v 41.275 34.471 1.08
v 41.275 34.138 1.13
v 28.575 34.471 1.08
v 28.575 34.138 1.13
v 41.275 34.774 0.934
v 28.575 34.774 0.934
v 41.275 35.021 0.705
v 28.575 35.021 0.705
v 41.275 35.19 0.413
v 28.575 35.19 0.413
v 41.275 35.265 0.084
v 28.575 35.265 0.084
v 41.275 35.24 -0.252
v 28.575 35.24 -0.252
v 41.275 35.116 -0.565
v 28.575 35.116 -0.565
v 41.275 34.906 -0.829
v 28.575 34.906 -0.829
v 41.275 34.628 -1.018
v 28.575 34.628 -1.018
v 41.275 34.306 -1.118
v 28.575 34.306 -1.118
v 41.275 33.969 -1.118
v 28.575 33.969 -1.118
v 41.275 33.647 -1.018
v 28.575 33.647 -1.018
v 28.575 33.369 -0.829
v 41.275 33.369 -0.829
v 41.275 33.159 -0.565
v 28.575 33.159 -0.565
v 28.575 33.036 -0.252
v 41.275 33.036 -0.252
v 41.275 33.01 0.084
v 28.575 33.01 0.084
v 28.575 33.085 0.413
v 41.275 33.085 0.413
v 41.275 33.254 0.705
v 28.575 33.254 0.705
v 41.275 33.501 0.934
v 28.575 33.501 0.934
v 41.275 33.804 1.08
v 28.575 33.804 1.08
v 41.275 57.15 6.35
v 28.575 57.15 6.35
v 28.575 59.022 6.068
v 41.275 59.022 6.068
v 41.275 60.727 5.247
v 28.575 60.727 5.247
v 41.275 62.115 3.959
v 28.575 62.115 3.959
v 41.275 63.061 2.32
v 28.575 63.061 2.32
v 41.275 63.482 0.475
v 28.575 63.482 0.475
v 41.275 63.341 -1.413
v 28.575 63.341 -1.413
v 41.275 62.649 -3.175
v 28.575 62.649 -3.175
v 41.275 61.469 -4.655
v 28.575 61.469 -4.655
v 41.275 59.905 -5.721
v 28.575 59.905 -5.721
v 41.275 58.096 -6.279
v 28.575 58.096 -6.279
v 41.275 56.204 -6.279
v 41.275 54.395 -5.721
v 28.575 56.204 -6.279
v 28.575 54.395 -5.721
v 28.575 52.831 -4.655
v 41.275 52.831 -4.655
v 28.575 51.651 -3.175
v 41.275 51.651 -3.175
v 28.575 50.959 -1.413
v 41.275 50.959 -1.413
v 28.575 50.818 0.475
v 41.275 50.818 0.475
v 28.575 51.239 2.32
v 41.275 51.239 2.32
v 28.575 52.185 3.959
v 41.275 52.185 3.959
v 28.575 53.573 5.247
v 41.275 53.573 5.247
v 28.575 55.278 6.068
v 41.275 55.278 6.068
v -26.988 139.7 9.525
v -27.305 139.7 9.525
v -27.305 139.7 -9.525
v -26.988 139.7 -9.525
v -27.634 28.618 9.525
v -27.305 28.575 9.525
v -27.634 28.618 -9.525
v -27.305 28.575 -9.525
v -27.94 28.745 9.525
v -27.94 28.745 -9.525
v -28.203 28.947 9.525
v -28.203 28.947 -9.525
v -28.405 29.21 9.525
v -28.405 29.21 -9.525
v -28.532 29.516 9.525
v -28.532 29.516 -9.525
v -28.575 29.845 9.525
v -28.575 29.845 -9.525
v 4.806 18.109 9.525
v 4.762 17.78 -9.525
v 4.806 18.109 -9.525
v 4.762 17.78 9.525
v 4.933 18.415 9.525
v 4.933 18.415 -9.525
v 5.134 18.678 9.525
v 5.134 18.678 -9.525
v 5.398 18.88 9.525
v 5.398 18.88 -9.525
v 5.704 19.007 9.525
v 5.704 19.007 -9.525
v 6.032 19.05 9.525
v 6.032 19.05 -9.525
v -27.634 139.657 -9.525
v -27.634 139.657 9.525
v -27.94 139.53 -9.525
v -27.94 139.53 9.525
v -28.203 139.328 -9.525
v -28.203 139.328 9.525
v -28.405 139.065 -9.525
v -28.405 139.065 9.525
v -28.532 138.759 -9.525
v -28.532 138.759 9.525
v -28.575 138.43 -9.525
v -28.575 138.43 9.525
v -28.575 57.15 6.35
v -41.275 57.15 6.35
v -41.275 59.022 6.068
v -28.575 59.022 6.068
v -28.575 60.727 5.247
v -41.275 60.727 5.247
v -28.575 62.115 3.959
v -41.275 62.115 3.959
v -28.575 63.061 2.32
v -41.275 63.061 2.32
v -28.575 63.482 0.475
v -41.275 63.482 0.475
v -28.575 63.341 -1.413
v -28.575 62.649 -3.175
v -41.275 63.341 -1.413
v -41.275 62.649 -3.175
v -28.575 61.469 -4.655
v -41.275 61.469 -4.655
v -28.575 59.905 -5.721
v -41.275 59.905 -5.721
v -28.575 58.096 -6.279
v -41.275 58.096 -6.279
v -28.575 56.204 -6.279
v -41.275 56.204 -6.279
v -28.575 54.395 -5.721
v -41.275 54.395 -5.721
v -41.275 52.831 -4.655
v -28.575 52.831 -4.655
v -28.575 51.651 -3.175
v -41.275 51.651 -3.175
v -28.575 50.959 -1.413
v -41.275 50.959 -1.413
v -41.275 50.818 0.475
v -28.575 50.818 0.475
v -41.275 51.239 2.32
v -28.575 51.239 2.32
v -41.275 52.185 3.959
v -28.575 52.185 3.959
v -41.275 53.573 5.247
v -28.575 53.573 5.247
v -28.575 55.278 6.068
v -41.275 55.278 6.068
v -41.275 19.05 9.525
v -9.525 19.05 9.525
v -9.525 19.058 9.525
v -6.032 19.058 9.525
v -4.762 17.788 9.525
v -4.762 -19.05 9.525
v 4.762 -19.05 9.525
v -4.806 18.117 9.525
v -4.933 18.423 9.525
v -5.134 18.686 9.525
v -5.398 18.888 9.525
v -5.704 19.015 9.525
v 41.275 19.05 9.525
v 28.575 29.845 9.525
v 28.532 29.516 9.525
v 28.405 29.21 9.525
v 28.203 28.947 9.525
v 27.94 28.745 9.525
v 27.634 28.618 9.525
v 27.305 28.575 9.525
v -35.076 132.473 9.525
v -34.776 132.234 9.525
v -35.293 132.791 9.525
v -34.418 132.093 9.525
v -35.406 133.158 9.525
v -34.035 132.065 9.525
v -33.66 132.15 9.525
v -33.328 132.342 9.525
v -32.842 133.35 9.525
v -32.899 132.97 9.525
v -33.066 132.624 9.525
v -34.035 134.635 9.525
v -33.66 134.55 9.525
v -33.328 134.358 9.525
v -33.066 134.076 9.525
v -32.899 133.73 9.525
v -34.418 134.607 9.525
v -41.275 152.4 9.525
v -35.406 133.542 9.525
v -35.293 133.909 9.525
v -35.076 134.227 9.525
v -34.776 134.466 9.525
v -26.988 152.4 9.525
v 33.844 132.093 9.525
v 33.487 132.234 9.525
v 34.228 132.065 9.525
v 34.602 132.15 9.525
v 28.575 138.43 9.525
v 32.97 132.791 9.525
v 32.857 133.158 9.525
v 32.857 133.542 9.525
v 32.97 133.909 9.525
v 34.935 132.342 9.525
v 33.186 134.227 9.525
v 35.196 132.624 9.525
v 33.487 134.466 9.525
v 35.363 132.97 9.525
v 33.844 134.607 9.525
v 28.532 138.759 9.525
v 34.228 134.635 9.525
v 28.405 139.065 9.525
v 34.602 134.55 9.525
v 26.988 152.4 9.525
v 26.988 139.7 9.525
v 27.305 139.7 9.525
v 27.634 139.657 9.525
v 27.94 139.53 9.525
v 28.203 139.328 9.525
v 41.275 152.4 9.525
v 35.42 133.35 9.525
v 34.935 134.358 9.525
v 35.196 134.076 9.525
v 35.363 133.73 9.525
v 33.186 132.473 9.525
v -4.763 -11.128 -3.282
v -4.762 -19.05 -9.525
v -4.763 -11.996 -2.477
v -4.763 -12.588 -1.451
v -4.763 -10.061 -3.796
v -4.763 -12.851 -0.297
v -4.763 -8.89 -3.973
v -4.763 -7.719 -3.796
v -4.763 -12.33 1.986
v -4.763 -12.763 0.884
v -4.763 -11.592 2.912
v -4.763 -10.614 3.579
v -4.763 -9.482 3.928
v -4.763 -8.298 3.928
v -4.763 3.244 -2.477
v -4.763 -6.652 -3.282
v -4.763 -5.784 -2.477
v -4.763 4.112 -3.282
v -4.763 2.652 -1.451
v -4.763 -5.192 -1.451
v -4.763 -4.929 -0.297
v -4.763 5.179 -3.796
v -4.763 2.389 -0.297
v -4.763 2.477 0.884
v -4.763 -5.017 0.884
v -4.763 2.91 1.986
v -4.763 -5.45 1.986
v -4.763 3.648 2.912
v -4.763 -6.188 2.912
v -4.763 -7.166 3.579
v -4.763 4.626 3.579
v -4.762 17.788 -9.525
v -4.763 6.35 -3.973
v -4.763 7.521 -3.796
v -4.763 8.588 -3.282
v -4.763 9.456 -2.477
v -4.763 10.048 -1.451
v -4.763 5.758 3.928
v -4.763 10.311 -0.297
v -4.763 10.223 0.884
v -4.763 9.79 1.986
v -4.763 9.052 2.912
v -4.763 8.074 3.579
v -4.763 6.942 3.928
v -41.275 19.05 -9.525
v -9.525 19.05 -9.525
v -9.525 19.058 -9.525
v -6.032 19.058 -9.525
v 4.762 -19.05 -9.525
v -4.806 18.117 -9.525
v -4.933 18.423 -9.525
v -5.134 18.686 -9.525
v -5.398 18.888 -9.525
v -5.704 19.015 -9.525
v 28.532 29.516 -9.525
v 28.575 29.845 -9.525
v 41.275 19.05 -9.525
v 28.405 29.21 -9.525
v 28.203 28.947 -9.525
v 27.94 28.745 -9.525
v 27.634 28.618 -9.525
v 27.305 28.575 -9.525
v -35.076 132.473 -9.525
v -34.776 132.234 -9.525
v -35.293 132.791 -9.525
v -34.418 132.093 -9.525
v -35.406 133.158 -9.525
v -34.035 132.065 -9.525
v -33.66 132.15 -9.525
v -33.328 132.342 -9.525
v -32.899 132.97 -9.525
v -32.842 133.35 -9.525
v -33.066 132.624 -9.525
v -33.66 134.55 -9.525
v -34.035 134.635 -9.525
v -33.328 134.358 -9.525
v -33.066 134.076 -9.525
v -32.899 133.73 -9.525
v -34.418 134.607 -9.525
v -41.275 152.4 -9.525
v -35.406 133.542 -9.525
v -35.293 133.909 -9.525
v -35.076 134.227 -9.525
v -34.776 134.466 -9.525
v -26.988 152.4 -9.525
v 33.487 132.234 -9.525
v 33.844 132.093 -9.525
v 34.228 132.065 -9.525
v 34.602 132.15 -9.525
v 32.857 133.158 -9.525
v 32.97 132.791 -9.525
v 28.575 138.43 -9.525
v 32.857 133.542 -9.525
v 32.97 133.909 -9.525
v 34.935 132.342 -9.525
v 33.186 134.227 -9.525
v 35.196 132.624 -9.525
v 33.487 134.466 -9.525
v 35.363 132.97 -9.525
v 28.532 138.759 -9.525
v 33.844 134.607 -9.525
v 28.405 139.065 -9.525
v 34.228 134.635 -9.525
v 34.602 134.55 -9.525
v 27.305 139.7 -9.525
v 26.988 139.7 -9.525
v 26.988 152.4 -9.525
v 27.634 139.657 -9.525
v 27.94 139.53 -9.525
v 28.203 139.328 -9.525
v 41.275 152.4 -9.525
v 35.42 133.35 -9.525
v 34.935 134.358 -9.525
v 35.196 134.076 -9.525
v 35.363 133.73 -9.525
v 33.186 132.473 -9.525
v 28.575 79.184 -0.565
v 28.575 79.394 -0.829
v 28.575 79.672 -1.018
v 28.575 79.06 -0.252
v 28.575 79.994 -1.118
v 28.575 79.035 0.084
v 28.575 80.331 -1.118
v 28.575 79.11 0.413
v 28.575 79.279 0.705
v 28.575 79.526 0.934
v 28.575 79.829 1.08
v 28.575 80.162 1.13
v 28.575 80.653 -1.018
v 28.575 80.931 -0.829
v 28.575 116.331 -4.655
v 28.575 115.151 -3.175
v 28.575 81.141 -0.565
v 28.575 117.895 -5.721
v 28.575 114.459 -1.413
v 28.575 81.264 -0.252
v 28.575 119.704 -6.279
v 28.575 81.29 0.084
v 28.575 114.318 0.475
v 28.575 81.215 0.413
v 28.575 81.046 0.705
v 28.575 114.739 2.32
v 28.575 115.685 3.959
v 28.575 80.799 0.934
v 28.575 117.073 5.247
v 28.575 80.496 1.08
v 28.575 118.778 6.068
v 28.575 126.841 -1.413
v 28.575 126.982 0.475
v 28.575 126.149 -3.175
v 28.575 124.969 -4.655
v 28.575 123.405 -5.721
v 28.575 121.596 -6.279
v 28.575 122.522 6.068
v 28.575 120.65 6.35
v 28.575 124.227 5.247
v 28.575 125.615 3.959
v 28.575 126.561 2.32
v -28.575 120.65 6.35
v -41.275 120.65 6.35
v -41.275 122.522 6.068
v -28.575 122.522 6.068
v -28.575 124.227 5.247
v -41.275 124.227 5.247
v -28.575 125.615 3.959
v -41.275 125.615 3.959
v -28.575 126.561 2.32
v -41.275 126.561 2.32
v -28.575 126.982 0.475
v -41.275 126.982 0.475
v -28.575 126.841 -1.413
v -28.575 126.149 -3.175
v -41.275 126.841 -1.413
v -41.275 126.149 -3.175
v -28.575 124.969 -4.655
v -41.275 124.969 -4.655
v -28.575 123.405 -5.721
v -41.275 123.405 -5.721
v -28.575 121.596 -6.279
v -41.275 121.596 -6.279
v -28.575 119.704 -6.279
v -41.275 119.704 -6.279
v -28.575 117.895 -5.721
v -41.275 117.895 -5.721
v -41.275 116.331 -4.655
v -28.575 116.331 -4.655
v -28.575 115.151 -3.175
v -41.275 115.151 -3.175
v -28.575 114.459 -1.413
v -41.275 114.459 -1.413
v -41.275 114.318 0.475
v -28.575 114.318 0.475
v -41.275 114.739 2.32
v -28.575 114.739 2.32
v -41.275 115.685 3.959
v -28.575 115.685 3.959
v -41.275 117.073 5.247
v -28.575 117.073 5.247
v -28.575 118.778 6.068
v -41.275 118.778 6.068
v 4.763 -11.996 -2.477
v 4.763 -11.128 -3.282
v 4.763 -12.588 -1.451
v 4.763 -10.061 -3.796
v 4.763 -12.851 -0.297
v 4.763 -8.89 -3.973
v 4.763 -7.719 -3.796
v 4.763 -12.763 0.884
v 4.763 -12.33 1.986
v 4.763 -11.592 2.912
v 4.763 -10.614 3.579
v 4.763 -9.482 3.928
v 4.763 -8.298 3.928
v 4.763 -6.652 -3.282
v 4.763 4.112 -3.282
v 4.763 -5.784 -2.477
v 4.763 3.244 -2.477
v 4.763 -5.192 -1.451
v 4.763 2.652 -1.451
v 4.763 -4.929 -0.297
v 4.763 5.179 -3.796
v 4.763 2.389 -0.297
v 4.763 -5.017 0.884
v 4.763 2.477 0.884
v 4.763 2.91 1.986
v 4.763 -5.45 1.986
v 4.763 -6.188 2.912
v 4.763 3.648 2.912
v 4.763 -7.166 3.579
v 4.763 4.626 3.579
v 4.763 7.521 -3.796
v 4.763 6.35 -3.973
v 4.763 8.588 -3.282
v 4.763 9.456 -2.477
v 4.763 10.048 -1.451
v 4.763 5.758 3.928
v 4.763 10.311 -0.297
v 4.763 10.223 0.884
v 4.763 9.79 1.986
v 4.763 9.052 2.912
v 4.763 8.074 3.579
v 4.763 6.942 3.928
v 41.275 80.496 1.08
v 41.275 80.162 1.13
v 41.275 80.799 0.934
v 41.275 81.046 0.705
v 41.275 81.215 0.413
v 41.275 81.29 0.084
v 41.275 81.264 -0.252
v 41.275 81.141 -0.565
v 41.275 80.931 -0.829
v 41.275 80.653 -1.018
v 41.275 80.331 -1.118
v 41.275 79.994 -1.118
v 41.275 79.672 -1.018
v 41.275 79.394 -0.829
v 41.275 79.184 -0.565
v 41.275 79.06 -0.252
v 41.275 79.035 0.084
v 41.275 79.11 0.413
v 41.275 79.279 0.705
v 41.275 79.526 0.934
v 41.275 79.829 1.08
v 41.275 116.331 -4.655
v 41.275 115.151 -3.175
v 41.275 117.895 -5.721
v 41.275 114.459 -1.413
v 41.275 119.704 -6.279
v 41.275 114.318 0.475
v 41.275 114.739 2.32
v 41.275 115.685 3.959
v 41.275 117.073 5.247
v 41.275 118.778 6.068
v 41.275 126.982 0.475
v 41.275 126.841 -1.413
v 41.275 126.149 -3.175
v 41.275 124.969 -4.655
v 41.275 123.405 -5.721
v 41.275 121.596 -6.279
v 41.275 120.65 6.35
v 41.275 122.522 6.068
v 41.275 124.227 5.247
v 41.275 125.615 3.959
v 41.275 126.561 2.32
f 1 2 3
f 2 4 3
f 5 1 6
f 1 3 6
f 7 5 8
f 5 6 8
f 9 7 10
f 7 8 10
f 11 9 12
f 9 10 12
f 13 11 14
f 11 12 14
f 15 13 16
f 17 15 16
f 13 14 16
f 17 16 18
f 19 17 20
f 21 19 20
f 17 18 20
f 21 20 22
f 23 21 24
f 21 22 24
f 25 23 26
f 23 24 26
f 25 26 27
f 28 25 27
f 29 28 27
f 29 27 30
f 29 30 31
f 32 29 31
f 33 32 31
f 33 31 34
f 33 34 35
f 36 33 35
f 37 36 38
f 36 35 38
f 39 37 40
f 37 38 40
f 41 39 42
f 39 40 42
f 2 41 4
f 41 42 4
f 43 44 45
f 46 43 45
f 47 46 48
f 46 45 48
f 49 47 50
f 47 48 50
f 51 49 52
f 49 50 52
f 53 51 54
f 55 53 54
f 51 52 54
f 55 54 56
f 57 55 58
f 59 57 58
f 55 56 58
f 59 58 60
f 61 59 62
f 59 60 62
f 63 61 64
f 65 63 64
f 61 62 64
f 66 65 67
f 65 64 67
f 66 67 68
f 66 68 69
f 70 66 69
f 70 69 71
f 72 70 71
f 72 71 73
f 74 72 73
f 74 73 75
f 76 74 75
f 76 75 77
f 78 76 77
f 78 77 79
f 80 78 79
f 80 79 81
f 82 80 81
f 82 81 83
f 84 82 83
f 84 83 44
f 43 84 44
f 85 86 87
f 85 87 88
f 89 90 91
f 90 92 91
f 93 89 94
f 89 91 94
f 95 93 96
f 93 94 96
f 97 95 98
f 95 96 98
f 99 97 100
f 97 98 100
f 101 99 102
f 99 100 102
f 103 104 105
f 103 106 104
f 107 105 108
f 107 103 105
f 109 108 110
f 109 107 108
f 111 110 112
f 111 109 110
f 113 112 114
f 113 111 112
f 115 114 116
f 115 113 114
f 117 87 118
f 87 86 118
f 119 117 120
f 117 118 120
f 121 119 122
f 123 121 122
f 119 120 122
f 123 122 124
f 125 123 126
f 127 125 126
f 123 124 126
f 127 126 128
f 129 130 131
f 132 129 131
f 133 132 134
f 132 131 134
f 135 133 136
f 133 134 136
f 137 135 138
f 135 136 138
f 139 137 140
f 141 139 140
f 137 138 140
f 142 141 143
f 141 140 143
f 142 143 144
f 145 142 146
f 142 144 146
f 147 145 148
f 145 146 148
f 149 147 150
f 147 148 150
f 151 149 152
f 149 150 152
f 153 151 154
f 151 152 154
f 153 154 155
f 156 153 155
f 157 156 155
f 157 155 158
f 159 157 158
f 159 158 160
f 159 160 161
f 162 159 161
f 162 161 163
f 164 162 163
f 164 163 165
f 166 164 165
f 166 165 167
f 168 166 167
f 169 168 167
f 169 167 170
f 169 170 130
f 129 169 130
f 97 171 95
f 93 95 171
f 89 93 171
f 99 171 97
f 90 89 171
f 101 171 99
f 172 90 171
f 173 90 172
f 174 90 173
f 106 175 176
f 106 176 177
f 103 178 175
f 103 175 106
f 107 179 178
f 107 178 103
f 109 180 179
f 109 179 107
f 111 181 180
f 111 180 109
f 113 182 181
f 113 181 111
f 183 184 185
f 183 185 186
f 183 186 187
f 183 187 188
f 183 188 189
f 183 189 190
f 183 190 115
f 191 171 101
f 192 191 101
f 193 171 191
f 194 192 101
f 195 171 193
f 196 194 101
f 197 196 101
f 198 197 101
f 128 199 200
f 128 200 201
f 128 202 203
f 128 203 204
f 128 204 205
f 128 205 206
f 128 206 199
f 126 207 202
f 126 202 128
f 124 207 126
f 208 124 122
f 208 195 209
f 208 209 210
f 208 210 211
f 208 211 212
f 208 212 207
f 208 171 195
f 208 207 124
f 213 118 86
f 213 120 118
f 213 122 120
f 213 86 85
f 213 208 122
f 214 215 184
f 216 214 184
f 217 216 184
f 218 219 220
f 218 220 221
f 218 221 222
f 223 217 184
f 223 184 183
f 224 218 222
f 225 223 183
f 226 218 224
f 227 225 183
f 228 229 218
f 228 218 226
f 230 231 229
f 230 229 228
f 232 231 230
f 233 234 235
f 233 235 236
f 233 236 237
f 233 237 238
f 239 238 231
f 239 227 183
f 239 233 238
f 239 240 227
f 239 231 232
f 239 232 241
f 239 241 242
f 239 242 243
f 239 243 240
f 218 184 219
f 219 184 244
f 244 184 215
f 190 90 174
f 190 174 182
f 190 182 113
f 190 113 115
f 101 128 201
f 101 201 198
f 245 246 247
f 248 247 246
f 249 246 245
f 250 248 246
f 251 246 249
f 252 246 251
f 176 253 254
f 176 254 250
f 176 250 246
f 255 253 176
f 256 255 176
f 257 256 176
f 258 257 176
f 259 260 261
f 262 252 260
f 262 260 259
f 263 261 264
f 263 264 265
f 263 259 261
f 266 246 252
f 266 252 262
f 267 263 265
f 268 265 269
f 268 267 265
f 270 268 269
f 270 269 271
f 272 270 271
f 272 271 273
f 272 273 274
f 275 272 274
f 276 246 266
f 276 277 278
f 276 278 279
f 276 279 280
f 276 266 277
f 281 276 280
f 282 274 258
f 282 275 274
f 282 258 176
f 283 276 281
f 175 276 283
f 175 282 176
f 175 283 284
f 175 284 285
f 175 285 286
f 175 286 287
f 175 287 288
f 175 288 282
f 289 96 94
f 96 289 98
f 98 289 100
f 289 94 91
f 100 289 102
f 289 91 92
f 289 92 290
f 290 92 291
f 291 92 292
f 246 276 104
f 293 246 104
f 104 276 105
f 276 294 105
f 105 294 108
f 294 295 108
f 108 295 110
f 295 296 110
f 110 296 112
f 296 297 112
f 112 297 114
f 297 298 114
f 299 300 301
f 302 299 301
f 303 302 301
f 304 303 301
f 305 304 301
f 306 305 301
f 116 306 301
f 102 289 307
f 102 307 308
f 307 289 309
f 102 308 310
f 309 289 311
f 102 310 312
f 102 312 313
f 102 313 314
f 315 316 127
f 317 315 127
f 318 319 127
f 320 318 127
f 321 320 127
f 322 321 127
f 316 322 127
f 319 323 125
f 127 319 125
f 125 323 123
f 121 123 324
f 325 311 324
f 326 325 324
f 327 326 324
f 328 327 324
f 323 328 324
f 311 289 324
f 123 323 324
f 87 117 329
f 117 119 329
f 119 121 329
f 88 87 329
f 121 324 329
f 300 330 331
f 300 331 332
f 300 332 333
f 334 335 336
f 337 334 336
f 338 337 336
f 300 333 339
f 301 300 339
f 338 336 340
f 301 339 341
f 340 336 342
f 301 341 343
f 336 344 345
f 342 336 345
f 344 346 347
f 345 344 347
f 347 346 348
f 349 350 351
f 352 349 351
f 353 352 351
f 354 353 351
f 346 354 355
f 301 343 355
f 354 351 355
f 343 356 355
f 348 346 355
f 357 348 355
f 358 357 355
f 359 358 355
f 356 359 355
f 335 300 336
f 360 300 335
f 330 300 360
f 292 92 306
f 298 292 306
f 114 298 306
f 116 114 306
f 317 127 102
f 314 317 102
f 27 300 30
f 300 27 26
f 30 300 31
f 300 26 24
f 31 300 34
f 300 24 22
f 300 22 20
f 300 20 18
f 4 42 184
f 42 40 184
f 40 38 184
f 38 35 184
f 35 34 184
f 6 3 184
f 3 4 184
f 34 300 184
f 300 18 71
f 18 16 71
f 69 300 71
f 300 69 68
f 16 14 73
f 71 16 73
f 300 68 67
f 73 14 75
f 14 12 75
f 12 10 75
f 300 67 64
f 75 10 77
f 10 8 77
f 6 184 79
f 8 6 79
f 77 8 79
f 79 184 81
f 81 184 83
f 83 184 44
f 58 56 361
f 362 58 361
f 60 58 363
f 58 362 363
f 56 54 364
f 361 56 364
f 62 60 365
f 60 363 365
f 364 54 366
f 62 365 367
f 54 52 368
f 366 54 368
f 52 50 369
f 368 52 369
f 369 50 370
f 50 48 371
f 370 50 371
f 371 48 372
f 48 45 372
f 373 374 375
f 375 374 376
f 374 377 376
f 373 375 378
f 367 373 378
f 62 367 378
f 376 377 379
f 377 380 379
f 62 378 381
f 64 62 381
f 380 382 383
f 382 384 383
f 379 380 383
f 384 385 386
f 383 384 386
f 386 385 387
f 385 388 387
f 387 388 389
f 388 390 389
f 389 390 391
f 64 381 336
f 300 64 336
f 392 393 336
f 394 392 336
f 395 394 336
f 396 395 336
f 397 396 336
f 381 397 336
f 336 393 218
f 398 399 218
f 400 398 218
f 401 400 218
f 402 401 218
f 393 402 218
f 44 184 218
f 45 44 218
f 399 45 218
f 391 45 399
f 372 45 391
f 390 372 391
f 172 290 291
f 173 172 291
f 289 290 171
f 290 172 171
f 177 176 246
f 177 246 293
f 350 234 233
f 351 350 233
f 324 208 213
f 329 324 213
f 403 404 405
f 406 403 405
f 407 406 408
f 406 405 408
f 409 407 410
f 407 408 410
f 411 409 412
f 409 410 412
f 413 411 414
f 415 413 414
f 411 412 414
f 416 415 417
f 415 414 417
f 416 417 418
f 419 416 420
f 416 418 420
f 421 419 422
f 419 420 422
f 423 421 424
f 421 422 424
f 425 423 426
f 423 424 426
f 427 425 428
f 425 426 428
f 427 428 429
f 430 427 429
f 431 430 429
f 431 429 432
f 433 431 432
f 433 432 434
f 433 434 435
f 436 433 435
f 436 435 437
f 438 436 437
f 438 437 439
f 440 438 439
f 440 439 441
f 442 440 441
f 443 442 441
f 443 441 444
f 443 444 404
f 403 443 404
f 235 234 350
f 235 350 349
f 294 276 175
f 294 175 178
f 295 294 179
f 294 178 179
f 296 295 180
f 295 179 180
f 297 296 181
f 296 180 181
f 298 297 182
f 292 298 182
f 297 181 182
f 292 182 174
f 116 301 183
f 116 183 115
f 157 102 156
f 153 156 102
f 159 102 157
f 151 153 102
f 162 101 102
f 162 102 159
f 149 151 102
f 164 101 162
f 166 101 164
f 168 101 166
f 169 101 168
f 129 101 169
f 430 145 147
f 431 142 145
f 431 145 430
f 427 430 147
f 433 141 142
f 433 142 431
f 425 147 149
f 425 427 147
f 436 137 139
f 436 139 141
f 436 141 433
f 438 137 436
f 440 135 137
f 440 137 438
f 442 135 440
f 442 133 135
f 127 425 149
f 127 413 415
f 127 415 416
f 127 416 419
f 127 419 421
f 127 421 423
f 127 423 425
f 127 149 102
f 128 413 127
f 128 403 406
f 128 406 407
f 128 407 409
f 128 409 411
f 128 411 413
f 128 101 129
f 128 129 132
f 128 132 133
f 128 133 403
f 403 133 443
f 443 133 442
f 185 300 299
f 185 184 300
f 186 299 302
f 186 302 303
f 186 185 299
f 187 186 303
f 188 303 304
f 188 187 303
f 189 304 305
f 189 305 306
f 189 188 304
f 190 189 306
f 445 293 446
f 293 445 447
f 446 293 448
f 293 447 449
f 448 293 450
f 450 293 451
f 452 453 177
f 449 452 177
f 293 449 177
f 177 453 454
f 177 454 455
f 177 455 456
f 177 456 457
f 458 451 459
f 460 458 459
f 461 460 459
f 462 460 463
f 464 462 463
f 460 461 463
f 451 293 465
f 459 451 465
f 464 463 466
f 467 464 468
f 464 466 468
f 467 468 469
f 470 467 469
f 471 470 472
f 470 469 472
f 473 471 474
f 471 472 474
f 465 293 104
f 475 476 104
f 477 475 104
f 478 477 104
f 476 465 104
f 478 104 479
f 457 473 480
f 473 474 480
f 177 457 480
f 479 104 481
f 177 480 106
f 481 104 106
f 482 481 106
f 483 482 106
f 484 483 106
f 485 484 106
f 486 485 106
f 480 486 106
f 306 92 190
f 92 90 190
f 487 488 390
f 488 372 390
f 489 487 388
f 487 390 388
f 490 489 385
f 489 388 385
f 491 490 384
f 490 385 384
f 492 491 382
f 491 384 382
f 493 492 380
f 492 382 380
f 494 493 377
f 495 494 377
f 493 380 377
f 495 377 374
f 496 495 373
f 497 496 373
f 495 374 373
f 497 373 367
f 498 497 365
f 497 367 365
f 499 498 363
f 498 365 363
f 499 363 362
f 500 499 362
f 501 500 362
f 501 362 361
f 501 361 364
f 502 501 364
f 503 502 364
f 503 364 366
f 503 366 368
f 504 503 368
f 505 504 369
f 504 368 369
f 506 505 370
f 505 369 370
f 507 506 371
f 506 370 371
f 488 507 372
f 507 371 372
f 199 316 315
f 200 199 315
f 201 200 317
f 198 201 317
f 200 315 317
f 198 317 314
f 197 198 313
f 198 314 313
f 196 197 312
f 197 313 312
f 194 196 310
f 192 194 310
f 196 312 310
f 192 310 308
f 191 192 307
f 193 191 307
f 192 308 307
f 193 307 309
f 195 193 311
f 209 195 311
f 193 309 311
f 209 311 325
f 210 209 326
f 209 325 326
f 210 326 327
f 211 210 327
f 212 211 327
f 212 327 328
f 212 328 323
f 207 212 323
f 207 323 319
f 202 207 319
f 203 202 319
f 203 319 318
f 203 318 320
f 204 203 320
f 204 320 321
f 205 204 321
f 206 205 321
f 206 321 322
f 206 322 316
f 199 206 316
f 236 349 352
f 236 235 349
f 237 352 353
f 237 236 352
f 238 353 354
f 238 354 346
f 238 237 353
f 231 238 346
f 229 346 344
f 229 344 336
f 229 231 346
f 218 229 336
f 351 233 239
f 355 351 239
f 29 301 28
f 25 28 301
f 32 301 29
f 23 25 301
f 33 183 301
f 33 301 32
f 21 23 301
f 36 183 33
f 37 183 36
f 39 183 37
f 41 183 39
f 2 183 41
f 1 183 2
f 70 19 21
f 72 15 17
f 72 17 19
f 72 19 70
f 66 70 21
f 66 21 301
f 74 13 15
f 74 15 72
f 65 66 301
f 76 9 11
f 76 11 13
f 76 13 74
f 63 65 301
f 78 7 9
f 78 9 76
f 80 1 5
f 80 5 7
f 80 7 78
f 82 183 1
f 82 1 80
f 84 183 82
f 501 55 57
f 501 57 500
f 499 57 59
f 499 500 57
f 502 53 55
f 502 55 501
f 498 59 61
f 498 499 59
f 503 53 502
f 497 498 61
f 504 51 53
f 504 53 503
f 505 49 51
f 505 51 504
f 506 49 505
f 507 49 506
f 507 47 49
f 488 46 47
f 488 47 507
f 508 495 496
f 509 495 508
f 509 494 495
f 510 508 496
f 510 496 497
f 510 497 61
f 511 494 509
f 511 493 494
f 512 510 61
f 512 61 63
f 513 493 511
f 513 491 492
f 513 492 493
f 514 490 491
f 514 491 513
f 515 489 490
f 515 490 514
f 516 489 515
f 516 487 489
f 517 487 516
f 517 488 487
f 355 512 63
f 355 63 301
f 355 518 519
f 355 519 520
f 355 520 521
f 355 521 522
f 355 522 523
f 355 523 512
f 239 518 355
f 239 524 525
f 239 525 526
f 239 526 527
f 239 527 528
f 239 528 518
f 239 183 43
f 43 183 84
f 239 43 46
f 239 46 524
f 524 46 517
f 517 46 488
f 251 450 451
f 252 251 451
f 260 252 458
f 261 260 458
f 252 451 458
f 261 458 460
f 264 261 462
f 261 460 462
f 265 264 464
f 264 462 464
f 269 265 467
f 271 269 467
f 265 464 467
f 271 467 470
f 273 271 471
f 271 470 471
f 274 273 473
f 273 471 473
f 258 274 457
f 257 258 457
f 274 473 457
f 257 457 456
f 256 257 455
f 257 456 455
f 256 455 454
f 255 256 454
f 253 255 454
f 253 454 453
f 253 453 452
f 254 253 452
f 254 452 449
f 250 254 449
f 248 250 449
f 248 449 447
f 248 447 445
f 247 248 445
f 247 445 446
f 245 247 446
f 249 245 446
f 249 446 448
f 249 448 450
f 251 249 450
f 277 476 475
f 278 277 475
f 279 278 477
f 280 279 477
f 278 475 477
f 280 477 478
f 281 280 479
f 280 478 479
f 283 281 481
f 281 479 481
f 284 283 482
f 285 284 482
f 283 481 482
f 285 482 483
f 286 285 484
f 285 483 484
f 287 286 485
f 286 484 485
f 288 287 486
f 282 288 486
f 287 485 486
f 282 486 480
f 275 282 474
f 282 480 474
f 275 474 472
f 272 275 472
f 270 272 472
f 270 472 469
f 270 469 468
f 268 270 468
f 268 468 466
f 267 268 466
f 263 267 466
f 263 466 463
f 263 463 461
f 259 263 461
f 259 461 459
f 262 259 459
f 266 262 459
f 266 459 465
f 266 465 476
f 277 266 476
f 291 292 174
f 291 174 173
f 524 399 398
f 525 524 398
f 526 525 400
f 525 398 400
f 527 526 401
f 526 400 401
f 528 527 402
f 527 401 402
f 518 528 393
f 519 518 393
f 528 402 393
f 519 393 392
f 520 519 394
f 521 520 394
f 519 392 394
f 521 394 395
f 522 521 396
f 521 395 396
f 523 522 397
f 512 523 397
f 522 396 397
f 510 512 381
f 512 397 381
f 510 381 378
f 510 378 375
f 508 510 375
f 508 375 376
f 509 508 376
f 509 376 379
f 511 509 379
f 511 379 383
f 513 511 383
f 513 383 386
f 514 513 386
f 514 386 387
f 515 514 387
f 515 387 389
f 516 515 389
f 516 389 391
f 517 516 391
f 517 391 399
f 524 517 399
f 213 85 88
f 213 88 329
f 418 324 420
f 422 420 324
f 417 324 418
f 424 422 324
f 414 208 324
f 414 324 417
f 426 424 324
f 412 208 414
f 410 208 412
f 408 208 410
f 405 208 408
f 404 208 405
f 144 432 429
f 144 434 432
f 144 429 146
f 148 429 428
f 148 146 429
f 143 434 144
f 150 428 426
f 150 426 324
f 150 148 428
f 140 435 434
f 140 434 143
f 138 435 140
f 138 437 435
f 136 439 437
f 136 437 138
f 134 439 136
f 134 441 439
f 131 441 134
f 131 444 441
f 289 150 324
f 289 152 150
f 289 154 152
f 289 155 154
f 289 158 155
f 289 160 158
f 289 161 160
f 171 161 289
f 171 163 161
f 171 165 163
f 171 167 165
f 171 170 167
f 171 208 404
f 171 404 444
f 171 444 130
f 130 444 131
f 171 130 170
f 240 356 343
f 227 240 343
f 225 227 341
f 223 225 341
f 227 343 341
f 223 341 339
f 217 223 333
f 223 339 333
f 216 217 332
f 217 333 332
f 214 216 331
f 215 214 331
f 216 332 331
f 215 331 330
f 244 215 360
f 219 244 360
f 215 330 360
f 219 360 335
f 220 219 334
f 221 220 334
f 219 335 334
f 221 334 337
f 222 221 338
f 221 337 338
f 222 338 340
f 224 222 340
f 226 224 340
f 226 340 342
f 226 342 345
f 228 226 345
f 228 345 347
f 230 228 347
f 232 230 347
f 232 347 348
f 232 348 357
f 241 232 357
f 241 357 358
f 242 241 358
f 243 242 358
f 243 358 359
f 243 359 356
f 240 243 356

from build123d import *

# Parameters (mm, degrees)
SKETCH1_W                 = 57.15
SKETCH1_H                 = 111.125
BOSS_EXTRUDE1_DEPTH       = 9.525
SKETCH2_R                 = 6.35
CUT_EXTRUDE1_DEPTH        = 83.55
SKETCH4_W                 = 4.7625
SKETCH4_H                 = 19.05
SKETCH4_H_2               = 19.057929795
CUT_EXTRUDE2_DEPTH        = 20.05
F_4_40_TAPPED_HOLE2_D     = 2.2606
F_4_40_TAPPED_HOLE2_DEPTH = 12.7
F_4_40_TAPPED_HOLE2_TIP   = 0.679152758
SKETCH14_W                = 9.525
SKETCH14_H                = 19.05
BOSS_EXTRUDE2_DEPTH       = 19.05
HOLE1_D                   = 7.94512
HOLE1_DEPTH               = 46.0375
HOLE1_TIP                 = 2.386954861
FILLET1_R                 = 1.27
SKETCH17_W                = 53.975
SKETCH17_H                = 12.7
CUT_EXTRUDE3_DEPTH        = 20.05
F_5_40_TAPPED_HOLE1_D     = 2.5781


with BuildPart() as part:
    # Sketch1 → Boss-Extrude1 (new body, symmetric)
    with BuildSketch(Plane.XY):
        Polygon((9.525, 0), (-9.525, 0), (-9.525, 19.05), (-41.275, 19.05), (-41.275, 131.596658994), (-41.275, 152.4), (41.275, 152.4), (41.275, 131.596658994), (41.275, 19.05), (9.525, 19.05), align=None)
        with Locations((0, 84.1375)):
            Rectangle(SKETCH1_W, SKETCH1_H, mode=Mode.SUBTRACT)
    extrude(amount=BOSS_EXTRUDE1_DEPTH, both=True)

    # Sketch2 → Cut-Extrude1 (cut, through all)
    with BuildSketch(Plane.ZY.offset(41.275)):
        with Locations((0, 57.15)):
            Circle(SKETCH2_R)
        with Locations((0, 120.65)):
            Circle(SKETCH2_R)
    extrude(amount=-CUT_EXTRUDE1_DEPTH, mode=Mode.SUBTRACT)

    # Sketch4 → Cut-Extrude2 (cut, through all)
    with BuildSketch(Plane(origin=(0, 0, -9.525), x_dir=(-1, 0, 0), z_dir=(0, 0, -1))):
        with Locations((-7.14375, 9.525)):
            Rectangle(SKETCH4_W, SKETCH4_H)
        with Locations((7.14375, 9.528964897)):
            Rectangle(SKETCH4_W, SKETCH4_H_2)
    extrude(amount=-CUT_EXTRUDE2_DEPTH, mode=Mode.SUBTRACT)

    # #4-40 Tapped Hole2
    with Locations(Plane(origin=(41.275, 0, 0), x_dir=(0, 0, -1), z_dir=(1, 0, 0))):
        with Locations((0, 80.1624), (0, 34.1376)):
            Hole(F_4_40_TAPPED_HOLE2_D / 2, depth=F_4_40_TAPPED_HOLE2_DEPTH)
            with Locations((0, 0, -(F_4_40_TAPPED_HOLE2_DEPTH + F_4_40_TAPPED_HOLE2_TIP / 2))):  # 118° drill point
                Cone(0, F_4_40_TAPPED_HOLE2_D / 2, F_4_40_TAPPED_HOLE2_TIP, mode=Mode.SUBTRACT)

    # Sketch14 → Boss-Extrude2 (add)
    with BuildSketch(Plane.XZ):
        Rectangle(SKETCH14_W, SKETCH14_H)
    extrude(amount=BOSS_EXTRUDE2_DEPTH)

    # Hole1
    with Locations(Plane.ZY.offset(4.7625)):
        with Locations((0, 6.35), (0, -8.89)):
            Hole(HOLE1_D / 2, depth=HOLE1_DEPTH)
            with Locations((0, 0, -(HOLE1_DEPTH + HOLE1_TIP / 2))):  # 118° drill point
                Cone(0, HOLE1_D / 2, HOLE1_TIP, mode=Mode.SUBTRACT)

    # Fillet1
    fillet1_edges = [part.edges().sort_by_distance(p)[0] for p in [
        (28.575, 139.7, 0),
        (-28.575, 139.7, 0),
        (-28.575, 28.575, 0),
        (28.575, 28.575, 0),
        (-4.7625, 19.057929795, 0),
        (4.7625, 19.05, 0),
    ]]
    fillet(fillet1_edges, radius=FILLET1_R)

    # Sketch17 → Cut-Extrude3 (cut, through all)
    with BuildSketch(Plane.XY.offset(9.525)):
        with Locations((0, 146.05)):
            Rectangle(SKETCH17_W, SKETCH17_H)
    extrude(amount=-CUT_EXTRUDE3_DEPTH, mode=Mode.SUBTRACT)

    # #5-40 Tapped Hole1 (through all)
    with Locations(Plane(origin=(0, 0, 9.525), x_dir=(-1, 0, 0), z_dir=(0, 0, 1))):
        with Locations((-34.13125, -133.35), (34.13125, -133.35)):
            Hole(F_5_40_TAPPED_HOLE1_D / 2)


solid = part.part
